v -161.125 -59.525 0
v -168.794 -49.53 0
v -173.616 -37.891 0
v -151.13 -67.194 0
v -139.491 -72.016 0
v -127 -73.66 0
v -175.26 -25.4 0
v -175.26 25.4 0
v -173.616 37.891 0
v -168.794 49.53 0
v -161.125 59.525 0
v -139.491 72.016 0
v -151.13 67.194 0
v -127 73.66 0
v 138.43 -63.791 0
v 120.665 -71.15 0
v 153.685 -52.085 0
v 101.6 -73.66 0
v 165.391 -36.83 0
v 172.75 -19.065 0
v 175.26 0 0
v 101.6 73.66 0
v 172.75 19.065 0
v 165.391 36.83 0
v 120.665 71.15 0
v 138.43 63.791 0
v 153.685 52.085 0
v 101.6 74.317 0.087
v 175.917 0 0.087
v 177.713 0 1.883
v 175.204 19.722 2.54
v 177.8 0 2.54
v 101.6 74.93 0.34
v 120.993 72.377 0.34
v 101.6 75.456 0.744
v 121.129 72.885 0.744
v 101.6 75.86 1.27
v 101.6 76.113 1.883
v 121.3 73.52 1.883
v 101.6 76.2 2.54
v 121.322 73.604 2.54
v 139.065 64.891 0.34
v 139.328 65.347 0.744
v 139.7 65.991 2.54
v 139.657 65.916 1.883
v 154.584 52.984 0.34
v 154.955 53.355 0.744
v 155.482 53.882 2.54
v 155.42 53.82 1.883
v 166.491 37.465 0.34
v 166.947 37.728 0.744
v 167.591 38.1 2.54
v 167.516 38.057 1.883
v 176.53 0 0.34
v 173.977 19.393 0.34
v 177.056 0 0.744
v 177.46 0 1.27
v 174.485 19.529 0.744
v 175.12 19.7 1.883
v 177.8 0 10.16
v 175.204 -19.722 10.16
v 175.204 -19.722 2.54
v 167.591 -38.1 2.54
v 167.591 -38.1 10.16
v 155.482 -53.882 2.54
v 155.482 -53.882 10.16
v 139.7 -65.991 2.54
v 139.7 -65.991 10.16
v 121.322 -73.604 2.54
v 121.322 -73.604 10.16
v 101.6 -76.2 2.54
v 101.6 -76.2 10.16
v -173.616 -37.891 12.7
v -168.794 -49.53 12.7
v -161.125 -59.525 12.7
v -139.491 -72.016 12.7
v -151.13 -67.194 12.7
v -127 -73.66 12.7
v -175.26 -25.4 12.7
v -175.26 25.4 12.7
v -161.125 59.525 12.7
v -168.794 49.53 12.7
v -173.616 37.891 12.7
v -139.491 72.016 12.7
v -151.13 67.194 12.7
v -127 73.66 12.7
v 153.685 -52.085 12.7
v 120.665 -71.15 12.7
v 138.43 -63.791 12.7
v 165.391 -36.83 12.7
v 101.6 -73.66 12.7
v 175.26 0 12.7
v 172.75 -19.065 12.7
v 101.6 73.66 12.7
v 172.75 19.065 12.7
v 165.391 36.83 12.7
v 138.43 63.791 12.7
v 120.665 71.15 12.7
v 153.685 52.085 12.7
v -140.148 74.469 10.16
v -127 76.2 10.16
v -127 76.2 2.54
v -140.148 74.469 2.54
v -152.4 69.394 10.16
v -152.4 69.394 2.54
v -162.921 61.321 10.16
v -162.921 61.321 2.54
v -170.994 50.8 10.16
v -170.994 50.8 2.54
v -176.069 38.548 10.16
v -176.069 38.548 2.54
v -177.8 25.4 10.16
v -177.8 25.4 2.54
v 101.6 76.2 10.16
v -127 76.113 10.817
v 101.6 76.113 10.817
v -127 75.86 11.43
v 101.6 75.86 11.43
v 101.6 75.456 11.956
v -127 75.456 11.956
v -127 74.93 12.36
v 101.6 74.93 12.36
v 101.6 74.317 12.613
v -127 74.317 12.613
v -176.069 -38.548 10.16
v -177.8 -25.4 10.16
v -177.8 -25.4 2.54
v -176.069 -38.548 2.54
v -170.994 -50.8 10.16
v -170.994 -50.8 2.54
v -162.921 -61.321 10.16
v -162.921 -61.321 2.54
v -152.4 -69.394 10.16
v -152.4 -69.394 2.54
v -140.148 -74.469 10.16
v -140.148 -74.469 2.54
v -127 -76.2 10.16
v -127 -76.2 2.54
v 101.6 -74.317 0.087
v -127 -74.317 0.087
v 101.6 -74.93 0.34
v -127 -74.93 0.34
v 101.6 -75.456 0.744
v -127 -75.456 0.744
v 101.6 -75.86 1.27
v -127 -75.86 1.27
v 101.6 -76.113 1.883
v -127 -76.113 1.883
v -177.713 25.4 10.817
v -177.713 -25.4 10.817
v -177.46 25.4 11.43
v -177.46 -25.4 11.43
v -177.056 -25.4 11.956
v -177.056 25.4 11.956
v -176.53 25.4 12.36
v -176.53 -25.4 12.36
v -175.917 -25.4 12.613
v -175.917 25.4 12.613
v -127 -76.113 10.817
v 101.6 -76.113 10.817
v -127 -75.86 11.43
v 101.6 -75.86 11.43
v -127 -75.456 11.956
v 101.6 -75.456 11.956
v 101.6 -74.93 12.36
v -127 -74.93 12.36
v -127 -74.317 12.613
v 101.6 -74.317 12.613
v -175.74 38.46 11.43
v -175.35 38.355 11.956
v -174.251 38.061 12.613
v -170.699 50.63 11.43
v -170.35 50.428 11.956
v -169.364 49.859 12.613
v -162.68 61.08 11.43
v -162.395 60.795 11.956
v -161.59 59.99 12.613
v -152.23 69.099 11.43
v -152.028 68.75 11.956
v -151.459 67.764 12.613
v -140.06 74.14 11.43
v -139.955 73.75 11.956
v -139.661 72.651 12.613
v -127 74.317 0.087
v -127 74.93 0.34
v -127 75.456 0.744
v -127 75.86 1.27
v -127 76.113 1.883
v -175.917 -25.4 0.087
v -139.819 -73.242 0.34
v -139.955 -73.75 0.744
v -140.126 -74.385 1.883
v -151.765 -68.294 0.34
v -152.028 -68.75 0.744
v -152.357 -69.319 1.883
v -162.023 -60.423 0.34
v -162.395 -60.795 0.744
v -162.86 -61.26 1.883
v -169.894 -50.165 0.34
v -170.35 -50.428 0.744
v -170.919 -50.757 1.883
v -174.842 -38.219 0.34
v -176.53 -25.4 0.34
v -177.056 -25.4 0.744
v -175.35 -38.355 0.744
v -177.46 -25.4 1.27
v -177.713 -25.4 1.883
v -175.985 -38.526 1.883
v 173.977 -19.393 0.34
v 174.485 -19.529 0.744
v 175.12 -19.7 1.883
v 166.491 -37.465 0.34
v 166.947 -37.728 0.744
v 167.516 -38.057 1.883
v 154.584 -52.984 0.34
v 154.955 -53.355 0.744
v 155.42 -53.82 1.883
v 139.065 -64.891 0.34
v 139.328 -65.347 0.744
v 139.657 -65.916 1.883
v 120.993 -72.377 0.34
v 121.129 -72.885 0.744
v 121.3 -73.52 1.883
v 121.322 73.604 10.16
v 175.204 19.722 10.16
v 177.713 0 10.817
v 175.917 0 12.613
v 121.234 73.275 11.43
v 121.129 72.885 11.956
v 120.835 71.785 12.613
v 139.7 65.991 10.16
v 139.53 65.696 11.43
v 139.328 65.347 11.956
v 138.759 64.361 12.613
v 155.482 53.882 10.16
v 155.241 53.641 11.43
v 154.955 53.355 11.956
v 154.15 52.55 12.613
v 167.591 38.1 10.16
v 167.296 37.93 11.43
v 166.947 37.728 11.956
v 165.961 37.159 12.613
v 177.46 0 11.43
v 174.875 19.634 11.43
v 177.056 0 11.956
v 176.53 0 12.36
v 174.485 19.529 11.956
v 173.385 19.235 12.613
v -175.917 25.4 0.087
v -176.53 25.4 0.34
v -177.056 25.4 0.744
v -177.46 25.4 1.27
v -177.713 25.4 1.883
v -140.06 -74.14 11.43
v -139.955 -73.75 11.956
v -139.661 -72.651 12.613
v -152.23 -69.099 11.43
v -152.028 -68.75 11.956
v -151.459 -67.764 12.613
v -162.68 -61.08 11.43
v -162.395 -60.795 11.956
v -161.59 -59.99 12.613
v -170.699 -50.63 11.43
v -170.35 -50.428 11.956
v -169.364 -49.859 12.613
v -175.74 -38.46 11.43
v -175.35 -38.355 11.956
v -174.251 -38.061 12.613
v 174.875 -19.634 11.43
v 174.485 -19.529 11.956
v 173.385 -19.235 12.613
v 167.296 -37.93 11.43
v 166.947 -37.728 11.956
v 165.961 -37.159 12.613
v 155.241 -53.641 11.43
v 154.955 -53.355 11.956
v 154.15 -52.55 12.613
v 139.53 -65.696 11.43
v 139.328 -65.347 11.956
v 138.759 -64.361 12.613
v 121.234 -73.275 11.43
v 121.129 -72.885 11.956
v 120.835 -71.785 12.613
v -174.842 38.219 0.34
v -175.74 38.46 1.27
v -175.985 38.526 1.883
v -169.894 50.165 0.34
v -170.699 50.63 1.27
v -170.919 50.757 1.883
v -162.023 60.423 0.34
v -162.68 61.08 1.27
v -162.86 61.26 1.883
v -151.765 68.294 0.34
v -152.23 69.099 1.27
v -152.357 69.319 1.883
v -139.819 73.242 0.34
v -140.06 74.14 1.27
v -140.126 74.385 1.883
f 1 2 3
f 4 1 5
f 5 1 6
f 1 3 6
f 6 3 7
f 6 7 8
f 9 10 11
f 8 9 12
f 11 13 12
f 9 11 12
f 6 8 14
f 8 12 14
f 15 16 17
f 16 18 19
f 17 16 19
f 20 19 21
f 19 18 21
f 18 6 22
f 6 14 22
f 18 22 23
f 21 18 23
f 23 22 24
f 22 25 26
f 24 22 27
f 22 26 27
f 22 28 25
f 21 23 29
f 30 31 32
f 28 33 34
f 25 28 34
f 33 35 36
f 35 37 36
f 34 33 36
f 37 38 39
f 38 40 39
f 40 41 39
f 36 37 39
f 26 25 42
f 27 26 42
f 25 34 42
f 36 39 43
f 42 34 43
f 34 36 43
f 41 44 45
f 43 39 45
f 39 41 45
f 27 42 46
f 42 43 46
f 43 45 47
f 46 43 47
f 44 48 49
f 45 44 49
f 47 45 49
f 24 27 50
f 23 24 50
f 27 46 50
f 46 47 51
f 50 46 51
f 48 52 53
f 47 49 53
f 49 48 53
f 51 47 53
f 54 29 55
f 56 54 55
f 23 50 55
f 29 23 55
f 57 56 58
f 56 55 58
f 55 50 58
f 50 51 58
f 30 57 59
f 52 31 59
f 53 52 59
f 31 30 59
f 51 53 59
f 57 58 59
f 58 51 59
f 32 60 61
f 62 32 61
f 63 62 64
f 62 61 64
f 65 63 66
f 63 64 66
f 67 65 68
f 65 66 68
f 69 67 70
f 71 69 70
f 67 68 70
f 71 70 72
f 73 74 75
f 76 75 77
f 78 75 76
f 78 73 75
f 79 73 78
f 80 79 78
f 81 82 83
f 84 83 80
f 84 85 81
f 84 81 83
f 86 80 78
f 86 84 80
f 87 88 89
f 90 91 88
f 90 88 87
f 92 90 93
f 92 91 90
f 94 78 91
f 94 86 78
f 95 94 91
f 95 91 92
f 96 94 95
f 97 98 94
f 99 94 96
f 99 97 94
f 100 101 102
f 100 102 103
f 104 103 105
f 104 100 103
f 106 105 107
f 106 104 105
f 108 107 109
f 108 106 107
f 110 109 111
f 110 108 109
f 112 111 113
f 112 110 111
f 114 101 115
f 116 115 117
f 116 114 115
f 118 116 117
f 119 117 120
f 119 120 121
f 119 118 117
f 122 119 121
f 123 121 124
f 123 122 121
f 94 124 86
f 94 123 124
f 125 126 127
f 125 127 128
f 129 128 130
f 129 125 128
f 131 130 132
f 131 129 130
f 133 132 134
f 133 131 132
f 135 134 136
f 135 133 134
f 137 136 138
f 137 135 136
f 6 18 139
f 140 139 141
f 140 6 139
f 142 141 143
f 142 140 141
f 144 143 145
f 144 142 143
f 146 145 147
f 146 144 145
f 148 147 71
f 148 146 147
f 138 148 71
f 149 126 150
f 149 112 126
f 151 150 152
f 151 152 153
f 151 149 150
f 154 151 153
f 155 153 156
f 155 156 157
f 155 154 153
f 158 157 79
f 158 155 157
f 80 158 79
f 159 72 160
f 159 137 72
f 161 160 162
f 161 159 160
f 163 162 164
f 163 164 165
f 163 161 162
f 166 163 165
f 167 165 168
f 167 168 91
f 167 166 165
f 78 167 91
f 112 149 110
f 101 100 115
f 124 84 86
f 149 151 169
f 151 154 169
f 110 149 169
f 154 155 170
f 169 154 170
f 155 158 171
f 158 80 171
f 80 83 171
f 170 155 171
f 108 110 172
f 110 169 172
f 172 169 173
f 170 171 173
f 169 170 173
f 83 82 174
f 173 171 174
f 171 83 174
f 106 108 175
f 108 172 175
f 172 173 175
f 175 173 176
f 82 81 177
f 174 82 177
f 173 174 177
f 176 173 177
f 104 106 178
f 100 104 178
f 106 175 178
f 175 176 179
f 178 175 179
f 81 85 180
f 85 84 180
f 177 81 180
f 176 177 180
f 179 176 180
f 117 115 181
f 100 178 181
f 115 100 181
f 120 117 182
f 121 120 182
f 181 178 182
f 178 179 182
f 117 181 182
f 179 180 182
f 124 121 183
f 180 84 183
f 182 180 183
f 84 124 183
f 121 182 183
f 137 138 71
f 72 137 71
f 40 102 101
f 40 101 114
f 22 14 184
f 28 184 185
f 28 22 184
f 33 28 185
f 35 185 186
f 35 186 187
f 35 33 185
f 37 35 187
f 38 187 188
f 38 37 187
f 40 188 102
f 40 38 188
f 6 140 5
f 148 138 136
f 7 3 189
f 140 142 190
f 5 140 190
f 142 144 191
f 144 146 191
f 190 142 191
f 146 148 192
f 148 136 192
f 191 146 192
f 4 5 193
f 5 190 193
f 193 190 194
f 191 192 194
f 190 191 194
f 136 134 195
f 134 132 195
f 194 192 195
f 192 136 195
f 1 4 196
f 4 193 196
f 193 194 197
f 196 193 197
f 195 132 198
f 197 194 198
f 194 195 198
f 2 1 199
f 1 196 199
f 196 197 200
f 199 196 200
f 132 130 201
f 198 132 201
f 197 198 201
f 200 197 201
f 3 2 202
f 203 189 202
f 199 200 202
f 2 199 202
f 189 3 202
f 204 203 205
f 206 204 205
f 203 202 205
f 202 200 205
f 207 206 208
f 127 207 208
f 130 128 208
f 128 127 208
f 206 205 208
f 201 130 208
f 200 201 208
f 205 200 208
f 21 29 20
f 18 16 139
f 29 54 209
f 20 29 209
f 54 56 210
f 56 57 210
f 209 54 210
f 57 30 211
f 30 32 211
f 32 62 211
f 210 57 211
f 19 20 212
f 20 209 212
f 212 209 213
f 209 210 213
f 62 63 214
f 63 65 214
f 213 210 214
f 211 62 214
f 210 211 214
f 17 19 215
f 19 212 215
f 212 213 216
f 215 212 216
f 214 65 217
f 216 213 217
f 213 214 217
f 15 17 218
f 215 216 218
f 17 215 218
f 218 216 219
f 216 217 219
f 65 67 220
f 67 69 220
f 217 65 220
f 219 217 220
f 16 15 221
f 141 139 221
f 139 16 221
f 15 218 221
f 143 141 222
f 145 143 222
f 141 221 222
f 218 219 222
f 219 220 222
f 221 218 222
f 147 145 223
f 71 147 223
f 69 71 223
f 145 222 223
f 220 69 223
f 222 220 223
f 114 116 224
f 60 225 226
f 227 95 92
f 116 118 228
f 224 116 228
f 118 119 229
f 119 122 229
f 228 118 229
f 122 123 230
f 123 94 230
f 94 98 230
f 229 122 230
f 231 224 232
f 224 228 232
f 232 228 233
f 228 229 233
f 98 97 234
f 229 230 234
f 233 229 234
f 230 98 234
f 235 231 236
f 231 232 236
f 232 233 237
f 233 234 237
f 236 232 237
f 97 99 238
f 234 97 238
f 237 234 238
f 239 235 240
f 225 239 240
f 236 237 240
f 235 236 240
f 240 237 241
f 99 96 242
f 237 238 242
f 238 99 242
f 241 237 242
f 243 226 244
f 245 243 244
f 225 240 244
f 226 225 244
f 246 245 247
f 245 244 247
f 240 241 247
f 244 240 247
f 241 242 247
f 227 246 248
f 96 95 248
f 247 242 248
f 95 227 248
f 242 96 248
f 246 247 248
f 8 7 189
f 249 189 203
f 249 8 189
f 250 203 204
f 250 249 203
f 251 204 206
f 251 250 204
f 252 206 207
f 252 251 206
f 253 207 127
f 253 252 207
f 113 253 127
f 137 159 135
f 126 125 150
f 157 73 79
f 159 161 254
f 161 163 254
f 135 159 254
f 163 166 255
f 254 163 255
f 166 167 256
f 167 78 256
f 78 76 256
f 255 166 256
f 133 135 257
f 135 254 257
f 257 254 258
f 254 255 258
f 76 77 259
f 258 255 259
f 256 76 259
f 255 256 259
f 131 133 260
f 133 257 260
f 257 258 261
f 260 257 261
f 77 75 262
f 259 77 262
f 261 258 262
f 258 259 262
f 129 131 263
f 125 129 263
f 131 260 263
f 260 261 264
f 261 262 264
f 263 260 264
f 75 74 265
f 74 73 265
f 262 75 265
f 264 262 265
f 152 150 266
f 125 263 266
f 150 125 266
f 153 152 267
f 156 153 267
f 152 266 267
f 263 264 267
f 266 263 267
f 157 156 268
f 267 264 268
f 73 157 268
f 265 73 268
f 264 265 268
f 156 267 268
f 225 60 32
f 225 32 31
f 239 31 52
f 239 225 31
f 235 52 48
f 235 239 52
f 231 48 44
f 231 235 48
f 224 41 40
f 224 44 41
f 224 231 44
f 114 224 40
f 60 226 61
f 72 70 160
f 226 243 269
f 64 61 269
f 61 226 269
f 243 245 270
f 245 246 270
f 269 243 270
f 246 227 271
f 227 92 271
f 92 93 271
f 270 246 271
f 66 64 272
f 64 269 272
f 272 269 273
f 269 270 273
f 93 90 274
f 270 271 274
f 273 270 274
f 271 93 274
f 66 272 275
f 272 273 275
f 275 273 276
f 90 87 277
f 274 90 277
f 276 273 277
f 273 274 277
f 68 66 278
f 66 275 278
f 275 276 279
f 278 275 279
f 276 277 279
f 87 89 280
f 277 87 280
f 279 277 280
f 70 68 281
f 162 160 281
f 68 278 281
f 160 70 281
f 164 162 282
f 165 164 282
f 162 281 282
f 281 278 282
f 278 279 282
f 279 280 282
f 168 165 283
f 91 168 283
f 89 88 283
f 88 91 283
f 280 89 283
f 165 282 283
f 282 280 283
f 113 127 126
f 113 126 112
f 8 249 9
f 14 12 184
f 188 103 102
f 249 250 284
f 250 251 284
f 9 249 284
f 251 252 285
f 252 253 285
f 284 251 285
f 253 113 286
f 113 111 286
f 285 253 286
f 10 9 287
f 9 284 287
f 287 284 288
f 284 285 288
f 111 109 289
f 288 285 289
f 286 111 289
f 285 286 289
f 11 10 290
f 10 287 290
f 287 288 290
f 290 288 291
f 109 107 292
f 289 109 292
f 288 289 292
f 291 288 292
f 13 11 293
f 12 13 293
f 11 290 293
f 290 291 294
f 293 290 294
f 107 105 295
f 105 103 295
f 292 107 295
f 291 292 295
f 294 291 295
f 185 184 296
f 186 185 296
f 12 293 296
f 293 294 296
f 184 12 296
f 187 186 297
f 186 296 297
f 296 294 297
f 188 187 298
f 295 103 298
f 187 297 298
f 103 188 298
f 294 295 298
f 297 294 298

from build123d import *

# Parameters (mm, degrees)
F0_W     = 355.6
F0_H     = 152.4
F1_DEPTH = 12.7
F2_R     = 76.2
F3_R     = 76.19999
F4_R     = 50.8
F5_R     = 50.8
F6_R     = 2.54


# Not quite as in the source:
# - a fillet or chamfer is up to 0.001 mm smaller than in the source, because OpenCascade refuses the exact size


with BuildPart() as f1:
    # F0 (on Top) → F1 (new body)
    with BuildSketch(Plane.XY):
        Rectangle(F0_W, F0_H)
    extrude(amount=F1_DEPTH)

    # F2
    f2_edges = [f1.edges().sort_by_distance(p)[0] for p in [
        (177.8, 76.2, 6.35),
    ]]
    fillet(f2_edges, radius=F2_R)

    # F3 (radius 76.2 in the source; OpenCascade refuses exactly that, so slightly less here)
    f3_edges = [f1.edges().sort_by_distance(p)[0] for p in [
        (177.8, -76.2, 6.35),
    ]]
    fillet(f3_edges, radius=F3_R)

    # F4
    f4_edges = [f1.edges().sort_by_distance(p)[0] for p in [
        (-177.8, 76.2, 6.35),
    ]]
    fillet(f4_edges, radius=F4_R)

    # F5
    f5_edges = [f1.edges().sort_by_distance(p)[0] for p in [
        (-177.8, -76.2, 6.35),
    ]]
    fillet(f5_edges, radius=F5_R)

    # F6
    f6_edges = [f1.edges().sort_by_distance(p)[0] for p in [
        (-12.7, 76.2, 12.7),
        (-12.7, 76.2, 0),
    ]]
    fillet(f6_edges, radius=F6_R)


solid = f1.part
